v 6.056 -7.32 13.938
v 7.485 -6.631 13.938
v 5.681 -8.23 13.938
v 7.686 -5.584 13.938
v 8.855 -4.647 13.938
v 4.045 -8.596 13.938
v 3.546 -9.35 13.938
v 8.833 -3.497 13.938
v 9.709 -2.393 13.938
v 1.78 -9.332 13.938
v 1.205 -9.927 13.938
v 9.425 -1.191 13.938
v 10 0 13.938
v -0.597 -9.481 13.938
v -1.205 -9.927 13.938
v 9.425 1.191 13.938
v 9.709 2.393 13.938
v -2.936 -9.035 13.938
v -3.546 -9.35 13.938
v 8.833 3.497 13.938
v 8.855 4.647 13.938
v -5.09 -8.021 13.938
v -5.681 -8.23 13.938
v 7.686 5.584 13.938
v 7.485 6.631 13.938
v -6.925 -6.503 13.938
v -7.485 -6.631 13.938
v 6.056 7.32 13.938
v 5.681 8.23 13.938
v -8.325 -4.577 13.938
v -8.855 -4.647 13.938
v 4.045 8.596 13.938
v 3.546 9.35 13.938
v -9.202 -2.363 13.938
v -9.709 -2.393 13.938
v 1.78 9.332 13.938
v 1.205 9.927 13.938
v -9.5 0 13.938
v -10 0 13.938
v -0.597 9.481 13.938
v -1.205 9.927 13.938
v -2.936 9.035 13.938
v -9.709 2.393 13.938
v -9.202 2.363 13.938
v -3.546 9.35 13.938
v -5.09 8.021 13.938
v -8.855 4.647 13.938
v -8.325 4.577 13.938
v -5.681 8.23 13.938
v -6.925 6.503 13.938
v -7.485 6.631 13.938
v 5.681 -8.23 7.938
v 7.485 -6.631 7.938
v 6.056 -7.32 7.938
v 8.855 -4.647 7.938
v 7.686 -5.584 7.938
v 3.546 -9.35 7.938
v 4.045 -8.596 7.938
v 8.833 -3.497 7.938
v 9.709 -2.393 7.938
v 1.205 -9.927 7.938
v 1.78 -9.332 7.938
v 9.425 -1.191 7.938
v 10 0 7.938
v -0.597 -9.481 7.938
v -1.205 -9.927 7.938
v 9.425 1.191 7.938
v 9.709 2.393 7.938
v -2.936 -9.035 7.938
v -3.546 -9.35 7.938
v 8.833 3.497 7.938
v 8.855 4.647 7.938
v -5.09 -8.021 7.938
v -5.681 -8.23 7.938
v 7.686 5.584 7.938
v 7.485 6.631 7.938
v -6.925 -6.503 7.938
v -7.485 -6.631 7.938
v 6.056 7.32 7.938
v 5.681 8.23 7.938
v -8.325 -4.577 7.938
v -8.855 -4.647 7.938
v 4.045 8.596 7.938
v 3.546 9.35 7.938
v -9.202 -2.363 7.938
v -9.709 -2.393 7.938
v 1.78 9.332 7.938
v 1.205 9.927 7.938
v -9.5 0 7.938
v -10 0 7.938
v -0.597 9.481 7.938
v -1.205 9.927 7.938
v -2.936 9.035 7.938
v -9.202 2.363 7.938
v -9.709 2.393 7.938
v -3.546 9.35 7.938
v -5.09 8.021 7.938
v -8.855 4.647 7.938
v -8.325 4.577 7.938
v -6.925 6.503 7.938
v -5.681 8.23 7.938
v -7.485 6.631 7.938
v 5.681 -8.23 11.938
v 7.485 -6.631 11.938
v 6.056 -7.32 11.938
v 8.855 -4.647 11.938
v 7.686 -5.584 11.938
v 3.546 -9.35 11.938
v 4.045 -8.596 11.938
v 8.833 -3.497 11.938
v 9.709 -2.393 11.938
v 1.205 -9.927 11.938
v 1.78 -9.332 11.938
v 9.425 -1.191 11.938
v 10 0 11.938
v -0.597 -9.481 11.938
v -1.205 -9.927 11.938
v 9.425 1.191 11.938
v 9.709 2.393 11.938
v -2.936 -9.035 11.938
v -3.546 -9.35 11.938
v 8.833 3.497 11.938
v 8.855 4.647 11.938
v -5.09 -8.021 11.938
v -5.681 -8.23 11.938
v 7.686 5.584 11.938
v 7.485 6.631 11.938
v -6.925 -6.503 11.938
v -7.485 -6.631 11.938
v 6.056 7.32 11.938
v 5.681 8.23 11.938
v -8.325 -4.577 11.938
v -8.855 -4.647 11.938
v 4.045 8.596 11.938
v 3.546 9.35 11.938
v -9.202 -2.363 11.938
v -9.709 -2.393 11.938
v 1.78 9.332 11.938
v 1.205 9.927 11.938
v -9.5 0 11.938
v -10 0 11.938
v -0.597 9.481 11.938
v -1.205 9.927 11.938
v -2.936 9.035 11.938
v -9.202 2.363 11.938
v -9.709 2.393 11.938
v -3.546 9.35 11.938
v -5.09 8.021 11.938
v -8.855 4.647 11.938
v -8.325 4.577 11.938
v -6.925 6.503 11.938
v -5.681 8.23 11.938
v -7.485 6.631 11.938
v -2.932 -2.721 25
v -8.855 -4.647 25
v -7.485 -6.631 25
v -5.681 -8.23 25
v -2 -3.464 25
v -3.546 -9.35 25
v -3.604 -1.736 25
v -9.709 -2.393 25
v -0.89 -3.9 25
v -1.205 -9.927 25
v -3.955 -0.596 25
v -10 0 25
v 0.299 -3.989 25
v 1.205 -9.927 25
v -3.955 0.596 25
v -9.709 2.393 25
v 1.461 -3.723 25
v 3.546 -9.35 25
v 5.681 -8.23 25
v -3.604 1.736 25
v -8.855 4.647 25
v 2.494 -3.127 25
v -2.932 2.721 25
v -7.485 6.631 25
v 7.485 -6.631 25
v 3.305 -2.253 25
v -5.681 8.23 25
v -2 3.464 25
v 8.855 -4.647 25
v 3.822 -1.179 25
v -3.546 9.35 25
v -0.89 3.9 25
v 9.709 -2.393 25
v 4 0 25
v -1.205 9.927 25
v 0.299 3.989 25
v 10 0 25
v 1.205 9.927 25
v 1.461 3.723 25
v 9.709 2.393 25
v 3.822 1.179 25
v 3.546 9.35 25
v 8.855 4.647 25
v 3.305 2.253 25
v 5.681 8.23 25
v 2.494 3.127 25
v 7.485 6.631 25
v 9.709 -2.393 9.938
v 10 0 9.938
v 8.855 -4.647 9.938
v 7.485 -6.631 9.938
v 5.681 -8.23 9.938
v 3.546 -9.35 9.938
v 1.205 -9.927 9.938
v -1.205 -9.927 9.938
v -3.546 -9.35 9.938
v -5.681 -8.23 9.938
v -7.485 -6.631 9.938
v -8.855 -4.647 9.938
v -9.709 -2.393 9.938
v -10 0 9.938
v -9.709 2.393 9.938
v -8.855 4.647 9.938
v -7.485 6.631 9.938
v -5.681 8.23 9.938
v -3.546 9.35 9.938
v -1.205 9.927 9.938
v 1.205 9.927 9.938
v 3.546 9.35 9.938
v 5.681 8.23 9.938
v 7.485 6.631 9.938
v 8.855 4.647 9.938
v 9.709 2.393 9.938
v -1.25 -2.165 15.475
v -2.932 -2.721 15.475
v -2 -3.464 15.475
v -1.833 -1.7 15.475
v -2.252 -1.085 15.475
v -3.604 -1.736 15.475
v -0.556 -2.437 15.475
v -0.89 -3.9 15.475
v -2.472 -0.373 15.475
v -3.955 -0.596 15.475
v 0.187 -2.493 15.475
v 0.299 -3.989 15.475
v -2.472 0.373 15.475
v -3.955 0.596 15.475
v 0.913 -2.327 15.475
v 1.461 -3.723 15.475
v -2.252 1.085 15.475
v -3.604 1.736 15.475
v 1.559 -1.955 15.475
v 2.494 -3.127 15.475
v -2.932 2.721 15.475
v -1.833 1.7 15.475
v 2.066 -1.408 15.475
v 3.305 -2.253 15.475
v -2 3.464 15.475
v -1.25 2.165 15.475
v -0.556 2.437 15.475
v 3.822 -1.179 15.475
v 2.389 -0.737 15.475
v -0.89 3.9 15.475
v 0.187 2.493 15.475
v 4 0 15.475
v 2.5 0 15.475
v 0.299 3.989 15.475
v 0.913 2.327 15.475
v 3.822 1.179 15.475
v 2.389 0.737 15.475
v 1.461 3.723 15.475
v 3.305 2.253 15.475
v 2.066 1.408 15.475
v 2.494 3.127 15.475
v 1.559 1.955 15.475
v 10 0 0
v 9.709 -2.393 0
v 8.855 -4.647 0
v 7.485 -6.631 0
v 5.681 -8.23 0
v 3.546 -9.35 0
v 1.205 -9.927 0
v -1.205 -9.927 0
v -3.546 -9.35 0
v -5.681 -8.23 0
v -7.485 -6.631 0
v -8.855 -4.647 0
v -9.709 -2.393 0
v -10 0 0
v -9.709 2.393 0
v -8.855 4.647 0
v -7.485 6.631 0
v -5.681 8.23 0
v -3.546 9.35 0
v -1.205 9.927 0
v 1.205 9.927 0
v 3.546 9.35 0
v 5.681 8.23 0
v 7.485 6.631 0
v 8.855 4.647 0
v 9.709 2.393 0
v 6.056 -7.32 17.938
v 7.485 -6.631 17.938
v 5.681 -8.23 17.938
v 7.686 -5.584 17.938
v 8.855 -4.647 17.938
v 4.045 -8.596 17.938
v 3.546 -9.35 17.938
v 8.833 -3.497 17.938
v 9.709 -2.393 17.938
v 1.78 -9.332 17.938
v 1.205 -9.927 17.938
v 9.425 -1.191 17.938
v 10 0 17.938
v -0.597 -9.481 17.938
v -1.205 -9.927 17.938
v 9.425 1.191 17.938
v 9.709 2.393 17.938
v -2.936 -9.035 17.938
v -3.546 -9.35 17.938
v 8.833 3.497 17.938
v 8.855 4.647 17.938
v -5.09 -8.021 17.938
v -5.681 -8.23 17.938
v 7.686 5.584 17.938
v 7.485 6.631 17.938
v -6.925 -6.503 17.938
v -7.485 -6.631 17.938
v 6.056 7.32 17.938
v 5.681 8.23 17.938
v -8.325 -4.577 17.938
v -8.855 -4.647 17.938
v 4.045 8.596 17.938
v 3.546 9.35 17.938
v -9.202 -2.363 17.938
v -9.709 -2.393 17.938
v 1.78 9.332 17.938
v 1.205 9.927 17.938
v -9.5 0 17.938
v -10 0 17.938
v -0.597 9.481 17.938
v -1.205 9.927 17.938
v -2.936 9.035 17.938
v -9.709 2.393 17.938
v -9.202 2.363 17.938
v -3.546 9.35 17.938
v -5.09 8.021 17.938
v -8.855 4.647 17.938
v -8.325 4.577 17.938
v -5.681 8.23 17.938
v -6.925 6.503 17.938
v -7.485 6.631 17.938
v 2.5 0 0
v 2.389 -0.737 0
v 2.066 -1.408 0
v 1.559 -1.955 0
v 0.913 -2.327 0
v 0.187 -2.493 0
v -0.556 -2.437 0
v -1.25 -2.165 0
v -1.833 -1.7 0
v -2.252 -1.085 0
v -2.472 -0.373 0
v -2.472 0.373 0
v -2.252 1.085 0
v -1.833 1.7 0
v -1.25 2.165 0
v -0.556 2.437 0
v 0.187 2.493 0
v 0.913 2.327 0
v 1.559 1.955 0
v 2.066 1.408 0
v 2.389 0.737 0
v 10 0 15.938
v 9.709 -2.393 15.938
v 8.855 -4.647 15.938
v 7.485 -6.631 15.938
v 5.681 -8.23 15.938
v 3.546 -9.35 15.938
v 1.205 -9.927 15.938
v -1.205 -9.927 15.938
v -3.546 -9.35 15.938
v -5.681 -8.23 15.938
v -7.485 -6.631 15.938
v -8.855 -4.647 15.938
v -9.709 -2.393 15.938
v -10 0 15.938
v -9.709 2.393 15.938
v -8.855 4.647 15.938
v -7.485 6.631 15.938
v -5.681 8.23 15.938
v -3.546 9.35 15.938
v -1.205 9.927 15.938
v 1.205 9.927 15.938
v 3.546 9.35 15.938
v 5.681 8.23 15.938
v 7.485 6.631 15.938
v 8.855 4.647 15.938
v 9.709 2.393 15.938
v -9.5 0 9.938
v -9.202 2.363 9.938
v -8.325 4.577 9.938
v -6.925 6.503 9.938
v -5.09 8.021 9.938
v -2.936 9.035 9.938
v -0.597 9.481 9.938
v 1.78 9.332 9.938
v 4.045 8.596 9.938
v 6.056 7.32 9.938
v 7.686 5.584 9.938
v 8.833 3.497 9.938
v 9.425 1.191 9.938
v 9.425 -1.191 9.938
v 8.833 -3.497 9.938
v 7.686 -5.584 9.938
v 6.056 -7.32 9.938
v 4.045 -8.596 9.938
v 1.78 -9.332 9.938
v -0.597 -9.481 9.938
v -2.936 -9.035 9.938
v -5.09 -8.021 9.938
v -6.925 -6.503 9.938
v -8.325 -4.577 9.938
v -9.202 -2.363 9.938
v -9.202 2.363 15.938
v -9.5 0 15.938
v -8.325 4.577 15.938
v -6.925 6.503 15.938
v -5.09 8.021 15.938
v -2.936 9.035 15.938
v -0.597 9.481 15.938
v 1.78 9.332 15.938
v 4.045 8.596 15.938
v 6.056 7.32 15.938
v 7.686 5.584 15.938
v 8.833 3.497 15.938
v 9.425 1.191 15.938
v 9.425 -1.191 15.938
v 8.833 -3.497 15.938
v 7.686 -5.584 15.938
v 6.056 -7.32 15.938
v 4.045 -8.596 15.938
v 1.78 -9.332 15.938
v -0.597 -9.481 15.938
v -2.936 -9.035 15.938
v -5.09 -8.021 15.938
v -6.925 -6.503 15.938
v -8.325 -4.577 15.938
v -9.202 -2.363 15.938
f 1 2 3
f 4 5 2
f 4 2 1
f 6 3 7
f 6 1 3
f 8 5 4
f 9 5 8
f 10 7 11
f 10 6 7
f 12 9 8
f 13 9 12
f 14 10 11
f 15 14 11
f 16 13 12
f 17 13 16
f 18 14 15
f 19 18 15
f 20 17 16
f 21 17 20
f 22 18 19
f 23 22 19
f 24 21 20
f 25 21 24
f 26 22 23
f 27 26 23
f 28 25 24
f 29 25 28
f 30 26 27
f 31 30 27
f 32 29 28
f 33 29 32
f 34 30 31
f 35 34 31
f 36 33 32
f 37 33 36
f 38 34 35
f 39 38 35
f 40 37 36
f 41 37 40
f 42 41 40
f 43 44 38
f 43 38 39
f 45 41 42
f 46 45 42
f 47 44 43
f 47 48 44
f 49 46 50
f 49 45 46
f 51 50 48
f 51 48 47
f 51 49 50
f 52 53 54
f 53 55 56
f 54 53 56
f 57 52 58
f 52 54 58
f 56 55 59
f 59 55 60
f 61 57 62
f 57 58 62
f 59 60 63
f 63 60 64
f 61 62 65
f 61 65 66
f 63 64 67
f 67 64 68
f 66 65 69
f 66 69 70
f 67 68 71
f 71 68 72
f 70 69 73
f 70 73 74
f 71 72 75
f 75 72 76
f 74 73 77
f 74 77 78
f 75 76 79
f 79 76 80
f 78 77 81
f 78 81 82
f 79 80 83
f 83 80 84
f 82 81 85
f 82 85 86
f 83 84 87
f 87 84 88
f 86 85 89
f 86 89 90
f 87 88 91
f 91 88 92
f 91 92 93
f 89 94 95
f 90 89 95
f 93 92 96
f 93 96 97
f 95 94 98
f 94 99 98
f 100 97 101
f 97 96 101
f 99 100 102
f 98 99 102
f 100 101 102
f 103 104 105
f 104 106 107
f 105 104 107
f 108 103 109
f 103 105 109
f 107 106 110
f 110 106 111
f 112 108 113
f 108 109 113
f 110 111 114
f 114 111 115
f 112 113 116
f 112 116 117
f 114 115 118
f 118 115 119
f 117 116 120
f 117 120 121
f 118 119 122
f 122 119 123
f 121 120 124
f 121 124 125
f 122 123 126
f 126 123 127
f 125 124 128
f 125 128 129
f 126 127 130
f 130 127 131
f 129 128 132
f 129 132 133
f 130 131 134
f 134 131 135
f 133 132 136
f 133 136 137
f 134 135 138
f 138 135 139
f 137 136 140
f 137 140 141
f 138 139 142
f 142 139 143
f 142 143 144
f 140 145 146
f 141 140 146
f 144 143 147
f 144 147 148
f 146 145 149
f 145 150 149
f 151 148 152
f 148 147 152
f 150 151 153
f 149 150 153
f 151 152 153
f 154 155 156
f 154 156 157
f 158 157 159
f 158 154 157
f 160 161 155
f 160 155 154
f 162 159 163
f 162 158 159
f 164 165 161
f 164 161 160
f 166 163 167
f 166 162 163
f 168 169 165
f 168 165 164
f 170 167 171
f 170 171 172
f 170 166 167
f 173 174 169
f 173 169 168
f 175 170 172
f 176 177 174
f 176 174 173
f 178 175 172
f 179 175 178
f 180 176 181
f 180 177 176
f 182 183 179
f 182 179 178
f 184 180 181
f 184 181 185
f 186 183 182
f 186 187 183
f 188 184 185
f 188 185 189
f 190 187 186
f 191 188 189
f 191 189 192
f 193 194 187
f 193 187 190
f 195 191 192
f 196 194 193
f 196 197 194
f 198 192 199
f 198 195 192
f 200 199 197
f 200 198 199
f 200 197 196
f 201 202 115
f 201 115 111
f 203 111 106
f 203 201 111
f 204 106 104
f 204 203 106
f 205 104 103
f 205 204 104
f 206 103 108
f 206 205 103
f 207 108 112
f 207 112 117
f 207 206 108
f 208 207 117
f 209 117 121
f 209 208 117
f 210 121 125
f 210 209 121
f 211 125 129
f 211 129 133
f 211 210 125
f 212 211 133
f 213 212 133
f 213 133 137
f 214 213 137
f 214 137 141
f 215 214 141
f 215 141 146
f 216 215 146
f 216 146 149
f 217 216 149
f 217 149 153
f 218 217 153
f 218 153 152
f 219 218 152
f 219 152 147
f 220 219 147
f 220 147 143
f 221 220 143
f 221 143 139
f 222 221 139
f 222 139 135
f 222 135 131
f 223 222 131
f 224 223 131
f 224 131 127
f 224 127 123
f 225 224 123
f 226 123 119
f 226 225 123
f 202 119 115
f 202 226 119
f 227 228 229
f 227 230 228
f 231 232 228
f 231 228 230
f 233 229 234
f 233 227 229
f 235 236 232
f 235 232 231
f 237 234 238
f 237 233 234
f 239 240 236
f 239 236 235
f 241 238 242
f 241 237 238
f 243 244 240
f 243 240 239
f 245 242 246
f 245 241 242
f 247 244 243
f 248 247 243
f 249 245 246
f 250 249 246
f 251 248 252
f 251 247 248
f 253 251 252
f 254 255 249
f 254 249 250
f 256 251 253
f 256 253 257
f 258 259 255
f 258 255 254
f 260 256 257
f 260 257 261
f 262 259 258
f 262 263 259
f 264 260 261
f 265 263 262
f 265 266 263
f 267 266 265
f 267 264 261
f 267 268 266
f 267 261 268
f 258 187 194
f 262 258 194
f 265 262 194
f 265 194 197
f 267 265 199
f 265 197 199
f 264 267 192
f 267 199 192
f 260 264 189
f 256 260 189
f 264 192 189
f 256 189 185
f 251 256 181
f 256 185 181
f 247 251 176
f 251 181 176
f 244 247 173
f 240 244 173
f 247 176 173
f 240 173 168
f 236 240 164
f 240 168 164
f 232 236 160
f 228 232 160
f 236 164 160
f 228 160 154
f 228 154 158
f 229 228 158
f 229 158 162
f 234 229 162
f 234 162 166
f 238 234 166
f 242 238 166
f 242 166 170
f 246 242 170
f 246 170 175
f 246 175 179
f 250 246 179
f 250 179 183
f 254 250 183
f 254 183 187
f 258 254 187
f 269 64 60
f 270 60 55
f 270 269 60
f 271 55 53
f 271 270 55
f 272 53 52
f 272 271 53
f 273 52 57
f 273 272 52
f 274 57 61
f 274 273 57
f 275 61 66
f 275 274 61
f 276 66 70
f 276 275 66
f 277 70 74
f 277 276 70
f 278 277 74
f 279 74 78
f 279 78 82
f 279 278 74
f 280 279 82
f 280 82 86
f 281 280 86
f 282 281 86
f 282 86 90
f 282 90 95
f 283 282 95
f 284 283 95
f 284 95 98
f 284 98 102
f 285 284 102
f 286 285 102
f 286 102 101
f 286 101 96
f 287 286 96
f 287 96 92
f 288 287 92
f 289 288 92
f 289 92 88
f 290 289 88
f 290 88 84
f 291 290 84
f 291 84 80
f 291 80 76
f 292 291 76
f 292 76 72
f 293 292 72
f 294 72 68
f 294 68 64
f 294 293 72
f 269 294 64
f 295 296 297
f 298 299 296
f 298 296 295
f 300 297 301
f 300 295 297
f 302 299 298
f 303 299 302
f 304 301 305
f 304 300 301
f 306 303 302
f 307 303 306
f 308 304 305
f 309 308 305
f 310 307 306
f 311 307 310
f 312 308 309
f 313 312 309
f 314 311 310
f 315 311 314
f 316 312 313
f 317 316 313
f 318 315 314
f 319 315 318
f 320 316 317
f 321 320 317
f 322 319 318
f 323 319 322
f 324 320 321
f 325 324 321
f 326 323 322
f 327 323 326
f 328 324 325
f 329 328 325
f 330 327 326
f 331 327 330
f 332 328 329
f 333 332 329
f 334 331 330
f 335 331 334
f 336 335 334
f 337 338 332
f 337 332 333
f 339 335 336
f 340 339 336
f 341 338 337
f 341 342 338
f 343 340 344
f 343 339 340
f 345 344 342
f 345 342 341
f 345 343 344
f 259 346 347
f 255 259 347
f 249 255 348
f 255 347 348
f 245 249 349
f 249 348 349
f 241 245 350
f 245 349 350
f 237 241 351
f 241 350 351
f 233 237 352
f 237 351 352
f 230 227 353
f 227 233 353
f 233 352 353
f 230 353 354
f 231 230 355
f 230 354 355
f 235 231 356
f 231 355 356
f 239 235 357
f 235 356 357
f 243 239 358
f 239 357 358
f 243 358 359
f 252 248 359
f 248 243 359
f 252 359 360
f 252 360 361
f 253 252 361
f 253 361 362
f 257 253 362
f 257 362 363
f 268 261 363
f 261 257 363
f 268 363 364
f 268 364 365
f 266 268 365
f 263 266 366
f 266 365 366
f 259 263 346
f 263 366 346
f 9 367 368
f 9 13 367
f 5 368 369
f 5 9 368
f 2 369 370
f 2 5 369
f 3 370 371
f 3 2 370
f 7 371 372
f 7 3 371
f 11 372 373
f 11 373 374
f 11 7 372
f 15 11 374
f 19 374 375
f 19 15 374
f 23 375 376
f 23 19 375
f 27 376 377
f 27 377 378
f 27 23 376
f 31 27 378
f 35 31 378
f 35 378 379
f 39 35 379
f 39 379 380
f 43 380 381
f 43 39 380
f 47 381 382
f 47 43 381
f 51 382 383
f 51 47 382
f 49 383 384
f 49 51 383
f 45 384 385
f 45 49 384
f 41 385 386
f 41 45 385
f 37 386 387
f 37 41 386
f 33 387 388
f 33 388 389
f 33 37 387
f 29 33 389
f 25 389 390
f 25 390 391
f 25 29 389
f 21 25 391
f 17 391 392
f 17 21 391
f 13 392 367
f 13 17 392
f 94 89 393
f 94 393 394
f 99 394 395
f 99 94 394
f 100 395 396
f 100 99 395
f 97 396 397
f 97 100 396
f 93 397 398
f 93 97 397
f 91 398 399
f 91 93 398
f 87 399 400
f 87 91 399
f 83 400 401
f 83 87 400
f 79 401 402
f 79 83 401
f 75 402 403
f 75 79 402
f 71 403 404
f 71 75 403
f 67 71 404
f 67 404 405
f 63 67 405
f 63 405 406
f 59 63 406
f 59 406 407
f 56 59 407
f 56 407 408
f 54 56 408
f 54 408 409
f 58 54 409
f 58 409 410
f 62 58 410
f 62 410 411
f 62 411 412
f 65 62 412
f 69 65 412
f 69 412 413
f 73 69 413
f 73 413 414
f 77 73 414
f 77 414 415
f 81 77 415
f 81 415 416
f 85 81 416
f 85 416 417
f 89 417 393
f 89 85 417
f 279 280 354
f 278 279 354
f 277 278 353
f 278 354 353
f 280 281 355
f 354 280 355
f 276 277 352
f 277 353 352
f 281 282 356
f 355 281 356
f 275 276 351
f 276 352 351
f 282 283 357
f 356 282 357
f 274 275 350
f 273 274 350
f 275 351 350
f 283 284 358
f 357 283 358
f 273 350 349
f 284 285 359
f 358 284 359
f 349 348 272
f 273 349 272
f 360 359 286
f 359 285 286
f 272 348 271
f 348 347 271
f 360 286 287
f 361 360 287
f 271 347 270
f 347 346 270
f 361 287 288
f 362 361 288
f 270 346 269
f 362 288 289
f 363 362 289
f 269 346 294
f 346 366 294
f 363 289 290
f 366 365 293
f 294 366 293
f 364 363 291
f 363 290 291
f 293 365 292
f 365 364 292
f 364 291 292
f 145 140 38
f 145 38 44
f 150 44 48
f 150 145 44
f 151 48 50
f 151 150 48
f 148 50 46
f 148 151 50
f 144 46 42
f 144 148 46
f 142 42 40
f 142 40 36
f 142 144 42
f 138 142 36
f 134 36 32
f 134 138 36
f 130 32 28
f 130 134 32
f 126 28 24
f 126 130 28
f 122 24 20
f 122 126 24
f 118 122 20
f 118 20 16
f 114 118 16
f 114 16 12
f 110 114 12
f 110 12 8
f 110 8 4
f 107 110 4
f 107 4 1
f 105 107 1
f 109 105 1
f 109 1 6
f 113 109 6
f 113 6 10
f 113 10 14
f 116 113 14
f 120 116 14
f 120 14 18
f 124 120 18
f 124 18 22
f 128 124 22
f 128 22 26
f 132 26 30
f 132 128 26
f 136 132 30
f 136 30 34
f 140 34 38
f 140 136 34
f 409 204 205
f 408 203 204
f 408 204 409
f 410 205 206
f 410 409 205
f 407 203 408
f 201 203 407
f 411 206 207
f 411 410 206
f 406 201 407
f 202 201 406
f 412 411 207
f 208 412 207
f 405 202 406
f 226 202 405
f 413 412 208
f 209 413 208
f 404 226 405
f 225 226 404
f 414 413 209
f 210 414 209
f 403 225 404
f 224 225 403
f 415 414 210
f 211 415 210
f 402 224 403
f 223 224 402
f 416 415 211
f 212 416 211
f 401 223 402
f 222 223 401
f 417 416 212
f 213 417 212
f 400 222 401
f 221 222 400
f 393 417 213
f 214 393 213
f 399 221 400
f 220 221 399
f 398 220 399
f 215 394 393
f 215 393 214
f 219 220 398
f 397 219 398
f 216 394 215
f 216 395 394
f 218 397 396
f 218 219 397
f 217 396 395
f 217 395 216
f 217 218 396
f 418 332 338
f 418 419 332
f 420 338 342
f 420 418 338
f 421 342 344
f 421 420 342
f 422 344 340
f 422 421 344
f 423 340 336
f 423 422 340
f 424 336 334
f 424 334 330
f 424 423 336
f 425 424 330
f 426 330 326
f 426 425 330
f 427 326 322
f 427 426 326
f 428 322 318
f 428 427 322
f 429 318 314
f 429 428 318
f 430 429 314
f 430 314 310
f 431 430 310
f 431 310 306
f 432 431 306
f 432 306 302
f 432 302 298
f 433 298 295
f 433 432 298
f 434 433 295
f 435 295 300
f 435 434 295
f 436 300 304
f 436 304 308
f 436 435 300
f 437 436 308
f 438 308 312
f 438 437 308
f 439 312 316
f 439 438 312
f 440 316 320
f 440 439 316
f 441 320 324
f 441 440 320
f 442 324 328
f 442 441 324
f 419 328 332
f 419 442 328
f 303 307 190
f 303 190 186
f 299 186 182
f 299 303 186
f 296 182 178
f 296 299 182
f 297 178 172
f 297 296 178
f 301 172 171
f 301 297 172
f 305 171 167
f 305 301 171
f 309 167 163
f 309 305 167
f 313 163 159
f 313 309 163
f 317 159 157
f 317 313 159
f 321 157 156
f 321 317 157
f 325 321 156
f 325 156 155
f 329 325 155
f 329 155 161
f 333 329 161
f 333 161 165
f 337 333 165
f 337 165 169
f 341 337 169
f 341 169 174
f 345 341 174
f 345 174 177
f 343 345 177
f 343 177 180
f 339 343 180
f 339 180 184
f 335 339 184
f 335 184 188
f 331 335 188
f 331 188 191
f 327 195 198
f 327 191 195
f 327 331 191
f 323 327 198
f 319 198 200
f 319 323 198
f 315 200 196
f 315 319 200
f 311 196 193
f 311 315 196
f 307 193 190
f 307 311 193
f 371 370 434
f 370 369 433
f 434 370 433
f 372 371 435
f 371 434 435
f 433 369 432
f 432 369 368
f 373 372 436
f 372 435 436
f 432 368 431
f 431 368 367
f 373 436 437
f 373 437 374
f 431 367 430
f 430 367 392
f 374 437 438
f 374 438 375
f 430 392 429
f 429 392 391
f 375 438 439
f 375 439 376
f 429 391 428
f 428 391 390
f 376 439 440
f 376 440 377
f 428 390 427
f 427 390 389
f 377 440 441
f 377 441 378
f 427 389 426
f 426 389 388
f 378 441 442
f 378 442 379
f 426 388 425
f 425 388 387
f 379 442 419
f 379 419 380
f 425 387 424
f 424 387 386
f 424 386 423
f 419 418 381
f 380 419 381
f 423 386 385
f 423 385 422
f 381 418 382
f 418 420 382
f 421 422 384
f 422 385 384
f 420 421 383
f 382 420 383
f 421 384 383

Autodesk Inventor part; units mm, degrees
ref_plane "YZ Plane" through (0, 0, 0) normal (1, 0, 0) x (0, 1, 0)
ref_plane "XZ Plane" through (0, 0, 0) normal (0, 1, 0) x (-1, 0, 0)
sketch "Sketch1" plane through (0, 0, 0) normal (0, 0, 1) x (1, 0, 0)
  circle A0 centre (0, 0) radius 2.5
  circle A1 centre (0, 0) radius 10
  dimension "d0" = 5
  dimension "d1" = 20
extrude "Extrusion1" add sketch "Sketch1" along normal blind 25
sketch "Sketch2" plane through (0, 0, 25) normal (0, 0, 1) x (1, 0, 0)
  circle A0 centre (0, 0) radius 2.5 projected
  circle A1 centre (0, 0) radius 10 projected
  circle A2 centre (0, 0) radius 4
  dimension "d4" = 8
extrude "Extrusion2" cut sketch "Sketch2" against normal blind 9.525 contours A2
ref_plane "Work Plane2" through (0, 0, 7.9375) normal (0, 0, -1) x (-1, 0, 0)
sketch "Sketch6" plane through (0, 0, 7.9375) normal (0, 0, -1) x (-1, 0, 0)
  circle A0 centre (0, 0) radius 11
  circle A1 centre (0, 0) radius 9.5
  dimension "d11" = 22
  dimension "d14" = 19
extrude "Extrusion5" cut sketch "Sketch6" against normal blind 2
pattern_linear "Rectangular Pattern1" count 3 spacing 4 along (0, 0, 1) of "Extrusion5"
properties part number "SM-H12"
